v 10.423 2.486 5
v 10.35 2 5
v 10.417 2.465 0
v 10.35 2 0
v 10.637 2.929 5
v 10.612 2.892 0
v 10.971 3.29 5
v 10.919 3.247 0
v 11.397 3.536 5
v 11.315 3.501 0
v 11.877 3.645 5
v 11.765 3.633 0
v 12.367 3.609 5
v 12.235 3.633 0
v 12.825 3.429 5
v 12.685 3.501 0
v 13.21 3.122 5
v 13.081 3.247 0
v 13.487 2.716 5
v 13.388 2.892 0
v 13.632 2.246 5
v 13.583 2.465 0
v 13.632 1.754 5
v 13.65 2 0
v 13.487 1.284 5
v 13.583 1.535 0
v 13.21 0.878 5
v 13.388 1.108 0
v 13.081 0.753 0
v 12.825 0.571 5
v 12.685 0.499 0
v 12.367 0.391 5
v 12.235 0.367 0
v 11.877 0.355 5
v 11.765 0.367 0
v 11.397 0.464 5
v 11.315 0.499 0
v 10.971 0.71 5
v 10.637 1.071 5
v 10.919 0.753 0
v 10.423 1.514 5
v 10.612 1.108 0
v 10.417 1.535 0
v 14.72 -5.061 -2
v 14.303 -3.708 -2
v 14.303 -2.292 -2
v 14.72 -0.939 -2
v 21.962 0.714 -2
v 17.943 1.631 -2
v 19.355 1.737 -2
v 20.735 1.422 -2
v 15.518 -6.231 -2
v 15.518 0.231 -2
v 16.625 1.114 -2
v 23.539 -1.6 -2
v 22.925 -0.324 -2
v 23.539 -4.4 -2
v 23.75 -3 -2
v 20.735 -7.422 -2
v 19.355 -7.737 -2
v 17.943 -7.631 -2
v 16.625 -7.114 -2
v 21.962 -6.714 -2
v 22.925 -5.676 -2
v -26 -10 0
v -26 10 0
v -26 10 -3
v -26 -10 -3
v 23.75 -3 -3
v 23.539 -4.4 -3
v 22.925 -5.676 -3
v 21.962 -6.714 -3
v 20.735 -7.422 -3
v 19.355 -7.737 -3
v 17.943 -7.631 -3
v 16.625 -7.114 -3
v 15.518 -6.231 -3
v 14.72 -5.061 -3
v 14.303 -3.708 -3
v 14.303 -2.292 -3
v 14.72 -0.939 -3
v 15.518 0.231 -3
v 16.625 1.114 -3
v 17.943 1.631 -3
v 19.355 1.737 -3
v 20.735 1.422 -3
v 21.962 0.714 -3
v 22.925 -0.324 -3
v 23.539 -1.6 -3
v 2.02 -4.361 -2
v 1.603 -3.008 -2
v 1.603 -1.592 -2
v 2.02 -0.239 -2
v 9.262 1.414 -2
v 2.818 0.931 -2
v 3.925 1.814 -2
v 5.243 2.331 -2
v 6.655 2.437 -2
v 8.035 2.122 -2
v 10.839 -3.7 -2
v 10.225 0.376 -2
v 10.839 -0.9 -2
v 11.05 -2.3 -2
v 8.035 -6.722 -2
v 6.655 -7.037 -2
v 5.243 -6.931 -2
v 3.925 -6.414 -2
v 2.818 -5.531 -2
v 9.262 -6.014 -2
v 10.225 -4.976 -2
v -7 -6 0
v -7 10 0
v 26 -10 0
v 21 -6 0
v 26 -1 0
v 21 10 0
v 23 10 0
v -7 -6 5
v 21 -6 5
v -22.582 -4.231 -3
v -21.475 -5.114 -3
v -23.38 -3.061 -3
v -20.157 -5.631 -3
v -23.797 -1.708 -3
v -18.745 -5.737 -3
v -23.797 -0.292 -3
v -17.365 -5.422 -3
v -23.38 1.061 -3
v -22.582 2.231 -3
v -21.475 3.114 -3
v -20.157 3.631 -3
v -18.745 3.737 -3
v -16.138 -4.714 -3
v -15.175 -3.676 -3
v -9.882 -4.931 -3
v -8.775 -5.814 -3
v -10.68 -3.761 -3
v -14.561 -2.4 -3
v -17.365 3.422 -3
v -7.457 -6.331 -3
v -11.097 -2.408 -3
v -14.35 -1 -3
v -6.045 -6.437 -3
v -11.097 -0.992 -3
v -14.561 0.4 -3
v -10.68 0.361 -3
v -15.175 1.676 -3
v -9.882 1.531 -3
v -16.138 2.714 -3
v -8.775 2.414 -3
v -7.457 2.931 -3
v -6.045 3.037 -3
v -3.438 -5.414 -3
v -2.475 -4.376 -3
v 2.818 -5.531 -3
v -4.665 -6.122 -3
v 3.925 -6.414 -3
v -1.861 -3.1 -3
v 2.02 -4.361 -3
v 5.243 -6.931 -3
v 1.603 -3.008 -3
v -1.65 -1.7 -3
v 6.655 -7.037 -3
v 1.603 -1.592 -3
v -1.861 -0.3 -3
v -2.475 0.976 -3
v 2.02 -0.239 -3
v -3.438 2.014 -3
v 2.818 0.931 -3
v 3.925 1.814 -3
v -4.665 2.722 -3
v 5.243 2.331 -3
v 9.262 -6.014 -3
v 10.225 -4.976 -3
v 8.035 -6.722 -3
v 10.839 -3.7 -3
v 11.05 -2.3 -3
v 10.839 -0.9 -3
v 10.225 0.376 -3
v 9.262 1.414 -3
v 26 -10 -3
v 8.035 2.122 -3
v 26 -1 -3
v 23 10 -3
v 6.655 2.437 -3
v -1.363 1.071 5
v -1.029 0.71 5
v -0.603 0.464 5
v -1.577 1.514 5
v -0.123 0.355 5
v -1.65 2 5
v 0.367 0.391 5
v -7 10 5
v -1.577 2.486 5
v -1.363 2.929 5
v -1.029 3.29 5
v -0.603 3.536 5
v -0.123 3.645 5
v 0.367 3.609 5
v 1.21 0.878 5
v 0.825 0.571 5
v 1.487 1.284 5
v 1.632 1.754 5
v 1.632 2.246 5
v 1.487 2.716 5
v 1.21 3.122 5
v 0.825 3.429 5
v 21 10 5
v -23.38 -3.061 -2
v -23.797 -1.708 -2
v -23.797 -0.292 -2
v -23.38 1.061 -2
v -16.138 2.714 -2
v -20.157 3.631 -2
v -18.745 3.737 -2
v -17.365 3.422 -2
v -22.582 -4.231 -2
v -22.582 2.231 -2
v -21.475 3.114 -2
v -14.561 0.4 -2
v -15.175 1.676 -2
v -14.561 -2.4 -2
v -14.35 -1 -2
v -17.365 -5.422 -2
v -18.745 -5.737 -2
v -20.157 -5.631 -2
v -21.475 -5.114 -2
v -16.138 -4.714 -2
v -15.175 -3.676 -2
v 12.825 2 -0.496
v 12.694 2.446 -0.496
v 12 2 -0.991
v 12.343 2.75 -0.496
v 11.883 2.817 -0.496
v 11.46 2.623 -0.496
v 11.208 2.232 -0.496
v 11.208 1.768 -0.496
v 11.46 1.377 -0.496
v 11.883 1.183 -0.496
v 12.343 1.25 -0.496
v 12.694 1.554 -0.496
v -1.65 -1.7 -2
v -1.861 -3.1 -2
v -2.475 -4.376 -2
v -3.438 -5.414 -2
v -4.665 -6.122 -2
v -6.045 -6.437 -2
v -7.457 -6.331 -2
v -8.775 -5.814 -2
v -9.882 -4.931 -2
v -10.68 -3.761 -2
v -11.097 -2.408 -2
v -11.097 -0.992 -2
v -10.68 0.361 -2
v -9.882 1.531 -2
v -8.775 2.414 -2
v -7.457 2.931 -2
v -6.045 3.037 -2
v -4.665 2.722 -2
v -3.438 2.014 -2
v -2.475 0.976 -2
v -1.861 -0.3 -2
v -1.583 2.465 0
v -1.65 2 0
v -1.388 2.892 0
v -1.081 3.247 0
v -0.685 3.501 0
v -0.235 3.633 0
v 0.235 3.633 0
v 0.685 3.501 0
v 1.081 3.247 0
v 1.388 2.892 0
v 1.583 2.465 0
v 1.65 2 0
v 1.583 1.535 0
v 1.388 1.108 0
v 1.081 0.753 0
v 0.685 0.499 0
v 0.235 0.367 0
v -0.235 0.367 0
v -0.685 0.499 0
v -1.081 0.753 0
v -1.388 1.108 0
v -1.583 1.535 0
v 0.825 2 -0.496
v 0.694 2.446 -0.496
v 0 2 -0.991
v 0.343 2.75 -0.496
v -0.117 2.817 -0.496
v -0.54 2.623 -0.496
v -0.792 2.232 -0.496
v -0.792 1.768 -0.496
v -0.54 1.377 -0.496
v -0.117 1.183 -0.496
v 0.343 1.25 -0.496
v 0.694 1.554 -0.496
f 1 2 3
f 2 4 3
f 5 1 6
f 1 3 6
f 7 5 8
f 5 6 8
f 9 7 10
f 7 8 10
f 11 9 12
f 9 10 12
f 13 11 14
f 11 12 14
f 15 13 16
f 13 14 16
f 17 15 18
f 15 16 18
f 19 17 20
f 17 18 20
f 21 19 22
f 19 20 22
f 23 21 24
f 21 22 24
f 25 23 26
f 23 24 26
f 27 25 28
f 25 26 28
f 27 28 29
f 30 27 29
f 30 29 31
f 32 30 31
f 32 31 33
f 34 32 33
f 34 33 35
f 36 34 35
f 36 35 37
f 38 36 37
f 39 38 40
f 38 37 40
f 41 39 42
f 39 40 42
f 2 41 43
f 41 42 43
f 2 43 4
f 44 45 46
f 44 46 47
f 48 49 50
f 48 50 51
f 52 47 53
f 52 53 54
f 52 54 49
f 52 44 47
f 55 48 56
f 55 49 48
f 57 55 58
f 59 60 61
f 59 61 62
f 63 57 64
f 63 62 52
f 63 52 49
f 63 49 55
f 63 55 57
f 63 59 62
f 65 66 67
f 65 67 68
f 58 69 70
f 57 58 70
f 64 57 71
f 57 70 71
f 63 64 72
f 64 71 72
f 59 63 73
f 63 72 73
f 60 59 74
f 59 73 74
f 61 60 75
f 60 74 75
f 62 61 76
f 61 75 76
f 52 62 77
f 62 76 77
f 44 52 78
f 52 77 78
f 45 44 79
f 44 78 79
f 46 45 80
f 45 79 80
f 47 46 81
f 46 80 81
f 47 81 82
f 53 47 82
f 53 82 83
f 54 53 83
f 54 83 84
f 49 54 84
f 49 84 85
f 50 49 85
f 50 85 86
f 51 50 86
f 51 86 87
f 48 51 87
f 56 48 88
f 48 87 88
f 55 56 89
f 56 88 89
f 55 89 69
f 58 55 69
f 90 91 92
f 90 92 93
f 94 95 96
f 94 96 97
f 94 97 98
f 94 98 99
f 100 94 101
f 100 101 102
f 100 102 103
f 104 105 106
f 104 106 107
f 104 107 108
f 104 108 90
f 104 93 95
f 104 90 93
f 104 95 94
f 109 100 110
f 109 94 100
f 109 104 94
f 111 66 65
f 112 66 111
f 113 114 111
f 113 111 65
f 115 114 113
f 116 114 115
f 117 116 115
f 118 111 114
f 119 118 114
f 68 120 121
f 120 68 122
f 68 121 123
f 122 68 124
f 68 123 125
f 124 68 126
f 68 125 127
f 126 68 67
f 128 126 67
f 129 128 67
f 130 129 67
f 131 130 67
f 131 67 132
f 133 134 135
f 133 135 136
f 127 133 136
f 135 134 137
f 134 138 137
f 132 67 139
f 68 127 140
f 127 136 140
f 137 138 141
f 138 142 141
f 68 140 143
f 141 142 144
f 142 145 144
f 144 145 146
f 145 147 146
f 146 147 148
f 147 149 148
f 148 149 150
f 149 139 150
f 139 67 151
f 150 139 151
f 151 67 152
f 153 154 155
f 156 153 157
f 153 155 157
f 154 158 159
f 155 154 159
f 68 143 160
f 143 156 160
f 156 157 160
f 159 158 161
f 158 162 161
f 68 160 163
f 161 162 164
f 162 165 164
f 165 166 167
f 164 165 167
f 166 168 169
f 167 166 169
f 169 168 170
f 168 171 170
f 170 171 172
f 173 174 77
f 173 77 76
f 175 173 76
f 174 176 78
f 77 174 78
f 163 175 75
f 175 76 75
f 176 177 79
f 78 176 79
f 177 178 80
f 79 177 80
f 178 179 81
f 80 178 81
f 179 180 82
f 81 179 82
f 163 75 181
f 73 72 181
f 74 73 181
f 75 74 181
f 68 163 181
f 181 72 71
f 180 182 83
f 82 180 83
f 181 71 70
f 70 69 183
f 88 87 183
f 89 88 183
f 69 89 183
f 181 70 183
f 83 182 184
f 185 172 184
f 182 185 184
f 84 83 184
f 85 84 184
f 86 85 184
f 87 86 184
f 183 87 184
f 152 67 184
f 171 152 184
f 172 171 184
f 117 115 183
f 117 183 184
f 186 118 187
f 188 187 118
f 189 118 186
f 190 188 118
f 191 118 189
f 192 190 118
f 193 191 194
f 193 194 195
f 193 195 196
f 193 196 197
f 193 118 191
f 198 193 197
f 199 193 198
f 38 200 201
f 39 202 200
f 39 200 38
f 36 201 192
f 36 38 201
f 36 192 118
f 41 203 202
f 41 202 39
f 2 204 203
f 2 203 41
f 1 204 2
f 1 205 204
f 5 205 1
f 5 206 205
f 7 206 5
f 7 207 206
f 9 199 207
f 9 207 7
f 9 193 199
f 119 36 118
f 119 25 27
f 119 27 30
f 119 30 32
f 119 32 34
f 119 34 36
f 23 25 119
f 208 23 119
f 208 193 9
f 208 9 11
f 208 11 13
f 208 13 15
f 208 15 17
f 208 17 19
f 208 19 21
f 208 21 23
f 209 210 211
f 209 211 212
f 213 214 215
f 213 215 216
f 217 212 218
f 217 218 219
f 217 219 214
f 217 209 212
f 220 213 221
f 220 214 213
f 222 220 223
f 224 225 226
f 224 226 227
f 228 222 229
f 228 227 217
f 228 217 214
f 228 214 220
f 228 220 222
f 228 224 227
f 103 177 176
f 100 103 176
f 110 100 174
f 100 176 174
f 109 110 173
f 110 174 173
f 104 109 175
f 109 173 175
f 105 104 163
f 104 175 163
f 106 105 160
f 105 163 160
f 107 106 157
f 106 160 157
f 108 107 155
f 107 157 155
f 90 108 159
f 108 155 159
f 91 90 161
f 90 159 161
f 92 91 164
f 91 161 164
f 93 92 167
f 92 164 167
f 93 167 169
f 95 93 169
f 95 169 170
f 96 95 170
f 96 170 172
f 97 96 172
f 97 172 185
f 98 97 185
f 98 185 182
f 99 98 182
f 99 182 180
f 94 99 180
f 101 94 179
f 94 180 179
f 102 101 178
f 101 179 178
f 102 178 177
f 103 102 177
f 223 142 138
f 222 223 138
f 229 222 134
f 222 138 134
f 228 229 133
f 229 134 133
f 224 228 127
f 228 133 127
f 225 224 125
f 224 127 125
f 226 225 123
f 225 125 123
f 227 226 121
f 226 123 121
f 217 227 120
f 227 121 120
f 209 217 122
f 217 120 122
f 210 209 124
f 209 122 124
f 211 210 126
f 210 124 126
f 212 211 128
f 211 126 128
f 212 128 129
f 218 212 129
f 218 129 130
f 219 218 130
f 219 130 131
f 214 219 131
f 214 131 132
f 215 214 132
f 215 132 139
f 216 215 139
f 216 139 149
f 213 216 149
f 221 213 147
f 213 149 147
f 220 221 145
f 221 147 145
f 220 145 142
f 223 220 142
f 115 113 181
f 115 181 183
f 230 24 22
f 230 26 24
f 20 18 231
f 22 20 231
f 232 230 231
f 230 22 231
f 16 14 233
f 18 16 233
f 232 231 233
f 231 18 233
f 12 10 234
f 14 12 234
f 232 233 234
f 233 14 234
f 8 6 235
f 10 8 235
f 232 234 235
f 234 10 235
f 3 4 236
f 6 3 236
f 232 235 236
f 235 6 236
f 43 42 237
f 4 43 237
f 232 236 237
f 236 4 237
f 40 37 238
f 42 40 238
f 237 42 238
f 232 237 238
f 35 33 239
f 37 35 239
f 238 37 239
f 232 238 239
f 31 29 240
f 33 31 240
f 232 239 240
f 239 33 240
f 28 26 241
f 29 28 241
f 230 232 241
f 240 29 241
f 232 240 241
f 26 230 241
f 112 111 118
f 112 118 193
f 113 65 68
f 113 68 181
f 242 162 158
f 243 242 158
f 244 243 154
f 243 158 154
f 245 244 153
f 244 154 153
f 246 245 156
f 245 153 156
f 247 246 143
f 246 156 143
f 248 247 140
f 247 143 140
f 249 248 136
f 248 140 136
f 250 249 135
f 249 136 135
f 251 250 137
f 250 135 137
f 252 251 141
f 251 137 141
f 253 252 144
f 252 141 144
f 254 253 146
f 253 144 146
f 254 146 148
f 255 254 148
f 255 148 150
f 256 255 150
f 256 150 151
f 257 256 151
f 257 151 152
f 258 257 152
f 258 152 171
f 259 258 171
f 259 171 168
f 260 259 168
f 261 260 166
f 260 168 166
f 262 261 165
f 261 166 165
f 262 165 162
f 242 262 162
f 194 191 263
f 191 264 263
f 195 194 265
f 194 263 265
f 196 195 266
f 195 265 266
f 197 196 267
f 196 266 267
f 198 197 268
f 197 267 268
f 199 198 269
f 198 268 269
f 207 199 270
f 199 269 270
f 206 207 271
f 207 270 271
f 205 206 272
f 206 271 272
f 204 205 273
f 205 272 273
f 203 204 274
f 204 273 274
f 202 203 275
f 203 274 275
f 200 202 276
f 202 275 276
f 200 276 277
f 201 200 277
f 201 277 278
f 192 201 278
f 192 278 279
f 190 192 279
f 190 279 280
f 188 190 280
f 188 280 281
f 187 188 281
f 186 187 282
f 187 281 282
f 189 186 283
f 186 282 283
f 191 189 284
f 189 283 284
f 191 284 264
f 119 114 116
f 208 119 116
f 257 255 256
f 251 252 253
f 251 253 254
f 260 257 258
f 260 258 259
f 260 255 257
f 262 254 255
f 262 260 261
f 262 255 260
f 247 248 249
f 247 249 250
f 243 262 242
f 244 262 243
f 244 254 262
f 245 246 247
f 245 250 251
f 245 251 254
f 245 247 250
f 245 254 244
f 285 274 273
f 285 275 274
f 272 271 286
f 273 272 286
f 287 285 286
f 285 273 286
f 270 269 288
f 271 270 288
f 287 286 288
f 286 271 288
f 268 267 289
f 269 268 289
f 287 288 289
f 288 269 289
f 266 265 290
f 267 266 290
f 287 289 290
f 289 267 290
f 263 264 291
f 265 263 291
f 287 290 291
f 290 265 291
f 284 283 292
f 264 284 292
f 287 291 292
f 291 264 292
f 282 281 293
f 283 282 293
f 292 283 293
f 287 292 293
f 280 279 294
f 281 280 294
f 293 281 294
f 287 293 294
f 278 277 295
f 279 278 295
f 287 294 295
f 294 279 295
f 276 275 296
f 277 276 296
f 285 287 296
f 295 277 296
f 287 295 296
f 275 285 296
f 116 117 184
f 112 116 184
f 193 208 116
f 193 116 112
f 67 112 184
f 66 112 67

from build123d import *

# Parameters (mm, degrees)
F1_DEPTH = 3
F2_R     = 4.75
F3_DEPTH = 1
F4_W     = 28
F4_H     = 16
F5_DEPTH = 5
F7_D     = 3.3
F7_DEPTH = 5
F7_TIP   = 0.9914200214


with BuildPart() as f1:
    # F0 (on Top) → F1 (new body)
    with BuildSketch(Plane.XY):
        Polygon((23, 10), (-26, 10), (-26, -10), (26, -10), (26, -1), align=None)
    extrude(amount=-F1_DEPTH)

    # F2 (on face) → F3 (cut)
    with BuildSketch(Plane(origin=(0, 0, -3), x_dir=(1, 0, 0), z_dir=(0, 0, -1))):
        with Locations((19, 3)):
            Circle(F2_R)
        with Locations((6.3, 2.3)):
            Circle(F2_R)
        with Locations((-6.4, 1.7)):
            Circle(F2_R)
        with Locations((-19.1, 1)):
            Circle(F2_R)
    extrude(amount=-F3_DEPTH, mode=Mode.SUBTRACT)

    # F4 (on face) → F5 (join)
    with BuildSketch(Plane.XY):
        with Locations((7, 2)):
            Rectangle(F4_W, F4_H)
    extrude(amount=F5_DEPTH)

    # F7
    with Locations(Plane.XY.offset(5)):
        with Locations((0, 2), (12, 2)):
            Hole(F7_D / 2, depth=F7_DEPTH)
            with Locations((0, 0, -(F7_DEPTH + F7_TIP / 2))):  # 118° drill point
                Cone(0, F7_D / 2, F7_TIP, mode=Mode.SUBTRACT)


solid = f1.part
